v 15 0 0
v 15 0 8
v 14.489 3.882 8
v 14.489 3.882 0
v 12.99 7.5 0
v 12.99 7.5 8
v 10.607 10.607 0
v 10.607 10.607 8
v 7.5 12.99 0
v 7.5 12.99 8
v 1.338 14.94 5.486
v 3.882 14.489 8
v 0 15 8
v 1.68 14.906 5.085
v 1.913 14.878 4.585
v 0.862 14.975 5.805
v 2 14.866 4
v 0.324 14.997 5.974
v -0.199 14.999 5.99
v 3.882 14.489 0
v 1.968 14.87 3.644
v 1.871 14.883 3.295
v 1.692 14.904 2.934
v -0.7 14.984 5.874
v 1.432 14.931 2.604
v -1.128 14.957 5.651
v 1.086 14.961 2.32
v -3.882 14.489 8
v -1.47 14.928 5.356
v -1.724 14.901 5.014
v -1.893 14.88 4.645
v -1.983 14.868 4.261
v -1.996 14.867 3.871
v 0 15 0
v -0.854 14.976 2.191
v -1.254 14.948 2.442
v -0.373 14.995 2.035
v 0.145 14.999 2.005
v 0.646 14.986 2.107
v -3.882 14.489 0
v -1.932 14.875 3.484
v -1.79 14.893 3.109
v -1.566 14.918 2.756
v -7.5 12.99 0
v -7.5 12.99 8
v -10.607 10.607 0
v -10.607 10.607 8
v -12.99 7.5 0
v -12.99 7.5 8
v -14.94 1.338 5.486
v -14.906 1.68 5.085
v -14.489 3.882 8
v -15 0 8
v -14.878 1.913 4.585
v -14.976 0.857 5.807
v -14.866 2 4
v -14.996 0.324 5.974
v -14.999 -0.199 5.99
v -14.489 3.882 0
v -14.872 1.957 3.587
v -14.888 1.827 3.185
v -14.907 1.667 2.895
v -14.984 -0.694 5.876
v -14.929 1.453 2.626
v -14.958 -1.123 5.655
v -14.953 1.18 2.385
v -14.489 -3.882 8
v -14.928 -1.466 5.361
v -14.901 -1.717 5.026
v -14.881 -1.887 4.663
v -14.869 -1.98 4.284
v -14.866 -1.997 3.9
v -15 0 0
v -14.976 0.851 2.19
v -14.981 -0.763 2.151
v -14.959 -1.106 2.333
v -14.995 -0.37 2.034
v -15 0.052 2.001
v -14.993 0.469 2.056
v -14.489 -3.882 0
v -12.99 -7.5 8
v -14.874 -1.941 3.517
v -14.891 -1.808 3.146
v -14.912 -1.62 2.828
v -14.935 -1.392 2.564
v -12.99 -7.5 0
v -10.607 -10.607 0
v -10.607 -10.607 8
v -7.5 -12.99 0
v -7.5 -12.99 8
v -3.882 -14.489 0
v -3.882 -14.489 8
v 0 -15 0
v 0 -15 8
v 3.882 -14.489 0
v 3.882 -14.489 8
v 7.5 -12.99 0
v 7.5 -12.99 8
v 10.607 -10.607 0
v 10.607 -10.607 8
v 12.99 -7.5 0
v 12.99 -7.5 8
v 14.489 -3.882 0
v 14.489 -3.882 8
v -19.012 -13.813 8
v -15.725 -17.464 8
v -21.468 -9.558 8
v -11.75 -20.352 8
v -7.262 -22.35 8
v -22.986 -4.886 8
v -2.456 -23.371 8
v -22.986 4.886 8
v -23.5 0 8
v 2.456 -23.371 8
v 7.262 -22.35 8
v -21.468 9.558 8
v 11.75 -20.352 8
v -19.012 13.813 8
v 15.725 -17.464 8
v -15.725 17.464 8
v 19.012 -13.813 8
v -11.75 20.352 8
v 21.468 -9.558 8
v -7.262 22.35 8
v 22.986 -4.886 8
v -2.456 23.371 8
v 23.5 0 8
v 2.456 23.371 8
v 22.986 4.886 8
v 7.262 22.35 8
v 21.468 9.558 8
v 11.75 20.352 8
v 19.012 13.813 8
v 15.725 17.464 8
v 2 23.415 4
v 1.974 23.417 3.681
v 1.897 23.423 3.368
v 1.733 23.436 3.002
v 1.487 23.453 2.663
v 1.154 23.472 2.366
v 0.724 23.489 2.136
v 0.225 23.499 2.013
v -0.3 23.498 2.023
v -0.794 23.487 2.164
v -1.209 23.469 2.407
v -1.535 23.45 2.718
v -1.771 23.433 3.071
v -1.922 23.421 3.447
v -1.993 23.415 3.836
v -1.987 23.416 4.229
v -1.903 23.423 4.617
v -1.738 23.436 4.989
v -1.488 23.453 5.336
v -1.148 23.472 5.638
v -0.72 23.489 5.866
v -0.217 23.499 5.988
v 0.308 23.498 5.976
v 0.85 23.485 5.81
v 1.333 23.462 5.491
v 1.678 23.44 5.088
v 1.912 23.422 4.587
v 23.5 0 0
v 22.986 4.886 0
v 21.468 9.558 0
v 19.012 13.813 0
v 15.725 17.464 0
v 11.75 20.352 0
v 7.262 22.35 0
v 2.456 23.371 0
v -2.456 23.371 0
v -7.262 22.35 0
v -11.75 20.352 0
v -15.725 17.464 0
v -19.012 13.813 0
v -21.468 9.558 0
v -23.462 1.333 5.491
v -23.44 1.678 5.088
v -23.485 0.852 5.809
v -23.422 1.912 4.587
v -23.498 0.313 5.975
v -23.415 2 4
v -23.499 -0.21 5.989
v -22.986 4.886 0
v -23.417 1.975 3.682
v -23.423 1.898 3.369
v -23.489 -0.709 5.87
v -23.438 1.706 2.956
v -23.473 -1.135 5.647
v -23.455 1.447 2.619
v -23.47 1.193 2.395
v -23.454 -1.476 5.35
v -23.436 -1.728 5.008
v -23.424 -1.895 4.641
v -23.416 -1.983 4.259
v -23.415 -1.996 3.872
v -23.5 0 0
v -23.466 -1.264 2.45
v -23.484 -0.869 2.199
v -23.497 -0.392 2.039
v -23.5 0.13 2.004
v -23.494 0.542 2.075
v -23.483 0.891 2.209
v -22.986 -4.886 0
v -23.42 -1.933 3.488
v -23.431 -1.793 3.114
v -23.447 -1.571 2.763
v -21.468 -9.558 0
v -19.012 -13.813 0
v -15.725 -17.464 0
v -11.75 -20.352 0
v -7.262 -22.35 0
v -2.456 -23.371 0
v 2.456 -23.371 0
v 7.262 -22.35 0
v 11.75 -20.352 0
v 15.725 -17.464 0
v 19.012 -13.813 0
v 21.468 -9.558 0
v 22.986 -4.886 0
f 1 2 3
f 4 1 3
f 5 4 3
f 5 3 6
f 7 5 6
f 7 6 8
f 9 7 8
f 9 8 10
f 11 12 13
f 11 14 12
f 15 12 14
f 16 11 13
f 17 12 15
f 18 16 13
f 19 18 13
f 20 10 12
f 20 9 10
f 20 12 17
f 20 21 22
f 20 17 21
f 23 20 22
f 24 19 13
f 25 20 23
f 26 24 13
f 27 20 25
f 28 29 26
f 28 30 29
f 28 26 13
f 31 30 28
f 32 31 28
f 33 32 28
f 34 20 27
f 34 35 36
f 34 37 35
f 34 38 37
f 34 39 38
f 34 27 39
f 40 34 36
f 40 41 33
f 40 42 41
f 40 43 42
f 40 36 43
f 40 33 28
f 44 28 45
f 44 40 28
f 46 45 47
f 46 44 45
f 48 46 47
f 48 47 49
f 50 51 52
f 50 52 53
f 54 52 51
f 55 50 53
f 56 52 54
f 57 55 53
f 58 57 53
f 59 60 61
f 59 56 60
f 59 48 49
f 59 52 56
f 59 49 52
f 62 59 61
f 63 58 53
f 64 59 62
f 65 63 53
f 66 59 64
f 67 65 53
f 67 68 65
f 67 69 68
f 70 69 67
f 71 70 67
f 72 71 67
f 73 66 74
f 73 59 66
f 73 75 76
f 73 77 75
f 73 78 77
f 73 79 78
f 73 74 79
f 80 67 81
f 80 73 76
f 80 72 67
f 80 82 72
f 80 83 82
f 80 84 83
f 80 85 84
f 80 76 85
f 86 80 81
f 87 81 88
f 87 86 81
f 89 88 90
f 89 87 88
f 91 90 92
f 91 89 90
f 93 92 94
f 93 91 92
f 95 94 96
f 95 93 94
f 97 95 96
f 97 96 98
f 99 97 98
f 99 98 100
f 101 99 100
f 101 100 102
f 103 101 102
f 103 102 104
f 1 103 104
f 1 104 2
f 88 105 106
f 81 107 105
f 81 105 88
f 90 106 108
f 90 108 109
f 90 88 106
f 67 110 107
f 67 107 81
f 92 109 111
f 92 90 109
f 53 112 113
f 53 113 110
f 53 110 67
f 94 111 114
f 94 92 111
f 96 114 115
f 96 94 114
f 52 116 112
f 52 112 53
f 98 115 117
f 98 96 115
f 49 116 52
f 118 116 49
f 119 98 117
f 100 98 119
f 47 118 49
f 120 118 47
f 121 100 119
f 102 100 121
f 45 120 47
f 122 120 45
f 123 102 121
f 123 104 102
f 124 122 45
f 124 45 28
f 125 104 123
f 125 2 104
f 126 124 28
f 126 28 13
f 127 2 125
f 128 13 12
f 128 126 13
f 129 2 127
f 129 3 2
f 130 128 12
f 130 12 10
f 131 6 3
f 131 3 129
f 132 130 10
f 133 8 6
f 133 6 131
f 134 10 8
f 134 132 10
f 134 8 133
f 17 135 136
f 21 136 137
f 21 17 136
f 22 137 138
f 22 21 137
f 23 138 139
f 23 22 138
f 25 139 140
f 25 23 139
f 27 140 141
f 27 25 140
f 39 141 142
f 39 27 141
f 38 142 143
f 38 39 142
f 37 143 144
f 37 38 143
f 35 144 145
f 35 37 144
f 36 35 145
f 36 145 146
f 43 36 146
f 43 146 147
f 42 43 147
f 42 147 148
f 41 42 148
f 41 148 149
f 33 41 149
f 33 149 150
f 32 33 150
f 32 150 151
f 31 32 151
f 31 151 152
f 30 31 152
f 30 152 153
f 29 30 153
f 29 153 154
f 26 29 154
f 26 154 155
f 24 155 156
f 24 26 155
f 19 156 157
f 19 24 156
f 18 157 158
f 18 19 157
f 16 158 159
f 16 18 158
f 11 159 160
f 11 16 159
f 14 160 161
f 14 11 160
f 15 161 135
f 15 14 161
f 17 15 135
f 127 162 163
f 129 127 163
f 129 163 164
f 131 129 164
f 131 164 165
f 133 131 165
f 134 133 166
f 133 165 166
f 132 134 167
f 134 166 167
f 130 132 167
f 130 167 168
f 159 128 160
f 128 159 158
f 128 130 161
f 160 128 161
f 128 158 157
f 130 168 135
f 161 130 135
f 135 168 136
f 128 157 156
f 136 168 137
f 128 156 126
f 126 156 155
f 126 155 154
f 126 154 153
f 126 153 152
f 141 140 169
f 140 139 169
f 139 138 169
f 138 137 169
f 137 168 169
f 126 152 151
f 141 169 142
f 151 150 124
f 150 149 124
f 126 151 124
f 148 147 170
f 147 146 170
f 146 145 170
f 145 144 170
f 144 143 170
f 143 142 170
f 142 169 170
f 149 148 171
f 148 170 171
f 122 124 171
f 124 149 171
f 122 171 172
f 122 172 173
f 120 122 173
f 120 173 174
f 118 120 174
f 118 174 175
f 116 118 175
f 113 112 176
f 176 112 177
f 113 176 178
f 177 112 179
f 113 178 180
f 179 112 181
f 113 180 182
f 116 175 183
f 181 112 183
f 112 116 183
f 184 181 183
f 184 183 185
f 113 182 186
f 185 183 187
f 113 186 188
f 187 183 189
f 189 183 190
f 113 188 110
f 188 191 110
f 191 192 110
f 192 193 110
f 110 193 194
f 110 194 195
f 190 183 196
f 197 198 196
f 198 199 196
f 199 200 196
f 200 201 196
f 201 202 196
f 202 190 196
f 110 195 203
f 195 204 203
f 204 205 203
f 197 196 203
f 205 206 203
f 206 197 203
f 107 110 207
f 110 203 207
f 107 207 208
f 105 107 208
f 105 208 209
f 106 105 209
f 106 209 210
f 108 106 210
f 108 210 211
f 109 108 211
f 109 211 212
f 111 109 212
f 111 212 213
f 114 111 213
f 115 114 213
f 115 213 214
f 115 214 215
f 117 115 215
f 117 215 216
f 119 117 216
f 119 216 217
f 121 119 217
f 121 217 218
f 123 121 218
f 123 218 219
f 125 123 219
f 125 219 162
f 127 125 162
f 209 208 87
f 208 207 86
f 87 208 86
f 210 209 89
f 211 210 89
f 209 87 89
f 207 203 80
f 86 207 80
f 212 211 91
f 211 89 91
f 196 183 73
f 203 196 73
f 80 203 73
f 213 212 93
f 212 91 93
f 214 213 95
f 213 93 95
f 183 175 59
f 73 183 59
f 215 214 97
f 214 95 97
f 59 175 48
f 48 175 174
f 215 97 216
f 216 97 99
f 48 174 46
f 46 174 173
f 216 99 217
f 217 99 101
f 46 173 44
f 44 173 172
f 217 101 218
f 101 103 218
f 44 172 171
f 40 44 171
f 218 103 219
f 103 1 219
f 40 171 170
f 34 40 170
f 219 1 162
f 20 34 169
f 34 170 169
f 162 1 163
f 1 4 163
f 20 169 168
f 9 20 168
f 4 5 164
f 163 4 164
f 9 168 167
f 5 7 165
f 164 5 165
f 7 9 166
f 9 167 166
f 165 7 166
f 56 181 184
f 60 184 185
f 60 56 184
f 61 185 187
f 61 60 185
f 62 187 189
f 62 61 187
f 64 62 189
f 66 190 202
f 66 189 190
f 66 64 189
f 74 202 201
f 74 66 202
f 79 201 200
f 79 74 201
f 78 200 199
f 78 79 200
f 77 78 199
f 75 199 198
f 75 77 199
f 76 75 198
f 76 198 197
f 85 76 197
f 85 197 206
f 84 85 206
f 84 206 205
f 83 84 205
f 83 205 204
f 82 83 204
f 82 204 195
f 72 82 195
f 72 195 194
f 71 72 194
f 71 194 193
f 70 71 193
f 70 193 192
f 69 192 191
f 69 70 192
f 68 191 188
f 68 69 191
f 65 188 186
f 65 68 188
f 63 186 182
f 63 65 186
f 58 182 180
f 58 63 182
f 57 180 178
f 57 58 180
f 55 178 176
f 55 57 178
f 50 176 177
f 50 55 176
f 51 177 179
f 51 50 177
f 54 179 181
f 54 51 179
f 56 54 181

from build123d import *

# Parameters (mm, degrees)
SKETCH1_R           = 23.5
SKETCH1_R_2         = 15
BOSS_EXTRUDE1_DEPTH = 8
CUT_EXTRUDE1_START  = -8.633931
SKETCH3_R           = 2
CUT_EXTRUDE1_DEPTH  = 8.633931
CIRPATTERN1_COUNT   = 2
CIRPATTERN1_ANGLE   = 90


with BuildPart() as part:
    # Sketch1 → Boss-Extrude1 (new body)
    with BuildSketch(Plane.XY):
        Circle(SKETCH1_R)
        Circle(SKETCH1_R_2, mode=Mode.SUBTRACT)
    extrude(amount=BOSS_EXTRUDE1_DEPTH)

    # Sketch3 → Cut-Extrude1 (cut)
    with BuildSketch(Plane(origin=(0, 23.5, 8), x_dir=(1, 0, 0), z_dir=(0, 1, 0)).offset(CUT_EXTRUDE1_START)):
        with Locations((0, 4)):
            Circle(SKETCH3_R)
    cut_extrude1 = extrude(amount=CUT_EXTRUDE1_DEPTH, mode=Mode.SUBTRACT)

    # CirPattern1: Cut-Extrude1 ×2 about axis
    cirpattern1_axis = Axis((0, 0, 8), (0, 0, 1))
    for i in range(1, CIRPATTERN1_COUNT):
        add(cut_extrude1.rotate(cirpattern1_axis, i * CIRPATTERN1_ANGLE / (CIRPATTERN1_COUNT - 1)), mode=Mode.SUBTRACT)


solid = part.part
